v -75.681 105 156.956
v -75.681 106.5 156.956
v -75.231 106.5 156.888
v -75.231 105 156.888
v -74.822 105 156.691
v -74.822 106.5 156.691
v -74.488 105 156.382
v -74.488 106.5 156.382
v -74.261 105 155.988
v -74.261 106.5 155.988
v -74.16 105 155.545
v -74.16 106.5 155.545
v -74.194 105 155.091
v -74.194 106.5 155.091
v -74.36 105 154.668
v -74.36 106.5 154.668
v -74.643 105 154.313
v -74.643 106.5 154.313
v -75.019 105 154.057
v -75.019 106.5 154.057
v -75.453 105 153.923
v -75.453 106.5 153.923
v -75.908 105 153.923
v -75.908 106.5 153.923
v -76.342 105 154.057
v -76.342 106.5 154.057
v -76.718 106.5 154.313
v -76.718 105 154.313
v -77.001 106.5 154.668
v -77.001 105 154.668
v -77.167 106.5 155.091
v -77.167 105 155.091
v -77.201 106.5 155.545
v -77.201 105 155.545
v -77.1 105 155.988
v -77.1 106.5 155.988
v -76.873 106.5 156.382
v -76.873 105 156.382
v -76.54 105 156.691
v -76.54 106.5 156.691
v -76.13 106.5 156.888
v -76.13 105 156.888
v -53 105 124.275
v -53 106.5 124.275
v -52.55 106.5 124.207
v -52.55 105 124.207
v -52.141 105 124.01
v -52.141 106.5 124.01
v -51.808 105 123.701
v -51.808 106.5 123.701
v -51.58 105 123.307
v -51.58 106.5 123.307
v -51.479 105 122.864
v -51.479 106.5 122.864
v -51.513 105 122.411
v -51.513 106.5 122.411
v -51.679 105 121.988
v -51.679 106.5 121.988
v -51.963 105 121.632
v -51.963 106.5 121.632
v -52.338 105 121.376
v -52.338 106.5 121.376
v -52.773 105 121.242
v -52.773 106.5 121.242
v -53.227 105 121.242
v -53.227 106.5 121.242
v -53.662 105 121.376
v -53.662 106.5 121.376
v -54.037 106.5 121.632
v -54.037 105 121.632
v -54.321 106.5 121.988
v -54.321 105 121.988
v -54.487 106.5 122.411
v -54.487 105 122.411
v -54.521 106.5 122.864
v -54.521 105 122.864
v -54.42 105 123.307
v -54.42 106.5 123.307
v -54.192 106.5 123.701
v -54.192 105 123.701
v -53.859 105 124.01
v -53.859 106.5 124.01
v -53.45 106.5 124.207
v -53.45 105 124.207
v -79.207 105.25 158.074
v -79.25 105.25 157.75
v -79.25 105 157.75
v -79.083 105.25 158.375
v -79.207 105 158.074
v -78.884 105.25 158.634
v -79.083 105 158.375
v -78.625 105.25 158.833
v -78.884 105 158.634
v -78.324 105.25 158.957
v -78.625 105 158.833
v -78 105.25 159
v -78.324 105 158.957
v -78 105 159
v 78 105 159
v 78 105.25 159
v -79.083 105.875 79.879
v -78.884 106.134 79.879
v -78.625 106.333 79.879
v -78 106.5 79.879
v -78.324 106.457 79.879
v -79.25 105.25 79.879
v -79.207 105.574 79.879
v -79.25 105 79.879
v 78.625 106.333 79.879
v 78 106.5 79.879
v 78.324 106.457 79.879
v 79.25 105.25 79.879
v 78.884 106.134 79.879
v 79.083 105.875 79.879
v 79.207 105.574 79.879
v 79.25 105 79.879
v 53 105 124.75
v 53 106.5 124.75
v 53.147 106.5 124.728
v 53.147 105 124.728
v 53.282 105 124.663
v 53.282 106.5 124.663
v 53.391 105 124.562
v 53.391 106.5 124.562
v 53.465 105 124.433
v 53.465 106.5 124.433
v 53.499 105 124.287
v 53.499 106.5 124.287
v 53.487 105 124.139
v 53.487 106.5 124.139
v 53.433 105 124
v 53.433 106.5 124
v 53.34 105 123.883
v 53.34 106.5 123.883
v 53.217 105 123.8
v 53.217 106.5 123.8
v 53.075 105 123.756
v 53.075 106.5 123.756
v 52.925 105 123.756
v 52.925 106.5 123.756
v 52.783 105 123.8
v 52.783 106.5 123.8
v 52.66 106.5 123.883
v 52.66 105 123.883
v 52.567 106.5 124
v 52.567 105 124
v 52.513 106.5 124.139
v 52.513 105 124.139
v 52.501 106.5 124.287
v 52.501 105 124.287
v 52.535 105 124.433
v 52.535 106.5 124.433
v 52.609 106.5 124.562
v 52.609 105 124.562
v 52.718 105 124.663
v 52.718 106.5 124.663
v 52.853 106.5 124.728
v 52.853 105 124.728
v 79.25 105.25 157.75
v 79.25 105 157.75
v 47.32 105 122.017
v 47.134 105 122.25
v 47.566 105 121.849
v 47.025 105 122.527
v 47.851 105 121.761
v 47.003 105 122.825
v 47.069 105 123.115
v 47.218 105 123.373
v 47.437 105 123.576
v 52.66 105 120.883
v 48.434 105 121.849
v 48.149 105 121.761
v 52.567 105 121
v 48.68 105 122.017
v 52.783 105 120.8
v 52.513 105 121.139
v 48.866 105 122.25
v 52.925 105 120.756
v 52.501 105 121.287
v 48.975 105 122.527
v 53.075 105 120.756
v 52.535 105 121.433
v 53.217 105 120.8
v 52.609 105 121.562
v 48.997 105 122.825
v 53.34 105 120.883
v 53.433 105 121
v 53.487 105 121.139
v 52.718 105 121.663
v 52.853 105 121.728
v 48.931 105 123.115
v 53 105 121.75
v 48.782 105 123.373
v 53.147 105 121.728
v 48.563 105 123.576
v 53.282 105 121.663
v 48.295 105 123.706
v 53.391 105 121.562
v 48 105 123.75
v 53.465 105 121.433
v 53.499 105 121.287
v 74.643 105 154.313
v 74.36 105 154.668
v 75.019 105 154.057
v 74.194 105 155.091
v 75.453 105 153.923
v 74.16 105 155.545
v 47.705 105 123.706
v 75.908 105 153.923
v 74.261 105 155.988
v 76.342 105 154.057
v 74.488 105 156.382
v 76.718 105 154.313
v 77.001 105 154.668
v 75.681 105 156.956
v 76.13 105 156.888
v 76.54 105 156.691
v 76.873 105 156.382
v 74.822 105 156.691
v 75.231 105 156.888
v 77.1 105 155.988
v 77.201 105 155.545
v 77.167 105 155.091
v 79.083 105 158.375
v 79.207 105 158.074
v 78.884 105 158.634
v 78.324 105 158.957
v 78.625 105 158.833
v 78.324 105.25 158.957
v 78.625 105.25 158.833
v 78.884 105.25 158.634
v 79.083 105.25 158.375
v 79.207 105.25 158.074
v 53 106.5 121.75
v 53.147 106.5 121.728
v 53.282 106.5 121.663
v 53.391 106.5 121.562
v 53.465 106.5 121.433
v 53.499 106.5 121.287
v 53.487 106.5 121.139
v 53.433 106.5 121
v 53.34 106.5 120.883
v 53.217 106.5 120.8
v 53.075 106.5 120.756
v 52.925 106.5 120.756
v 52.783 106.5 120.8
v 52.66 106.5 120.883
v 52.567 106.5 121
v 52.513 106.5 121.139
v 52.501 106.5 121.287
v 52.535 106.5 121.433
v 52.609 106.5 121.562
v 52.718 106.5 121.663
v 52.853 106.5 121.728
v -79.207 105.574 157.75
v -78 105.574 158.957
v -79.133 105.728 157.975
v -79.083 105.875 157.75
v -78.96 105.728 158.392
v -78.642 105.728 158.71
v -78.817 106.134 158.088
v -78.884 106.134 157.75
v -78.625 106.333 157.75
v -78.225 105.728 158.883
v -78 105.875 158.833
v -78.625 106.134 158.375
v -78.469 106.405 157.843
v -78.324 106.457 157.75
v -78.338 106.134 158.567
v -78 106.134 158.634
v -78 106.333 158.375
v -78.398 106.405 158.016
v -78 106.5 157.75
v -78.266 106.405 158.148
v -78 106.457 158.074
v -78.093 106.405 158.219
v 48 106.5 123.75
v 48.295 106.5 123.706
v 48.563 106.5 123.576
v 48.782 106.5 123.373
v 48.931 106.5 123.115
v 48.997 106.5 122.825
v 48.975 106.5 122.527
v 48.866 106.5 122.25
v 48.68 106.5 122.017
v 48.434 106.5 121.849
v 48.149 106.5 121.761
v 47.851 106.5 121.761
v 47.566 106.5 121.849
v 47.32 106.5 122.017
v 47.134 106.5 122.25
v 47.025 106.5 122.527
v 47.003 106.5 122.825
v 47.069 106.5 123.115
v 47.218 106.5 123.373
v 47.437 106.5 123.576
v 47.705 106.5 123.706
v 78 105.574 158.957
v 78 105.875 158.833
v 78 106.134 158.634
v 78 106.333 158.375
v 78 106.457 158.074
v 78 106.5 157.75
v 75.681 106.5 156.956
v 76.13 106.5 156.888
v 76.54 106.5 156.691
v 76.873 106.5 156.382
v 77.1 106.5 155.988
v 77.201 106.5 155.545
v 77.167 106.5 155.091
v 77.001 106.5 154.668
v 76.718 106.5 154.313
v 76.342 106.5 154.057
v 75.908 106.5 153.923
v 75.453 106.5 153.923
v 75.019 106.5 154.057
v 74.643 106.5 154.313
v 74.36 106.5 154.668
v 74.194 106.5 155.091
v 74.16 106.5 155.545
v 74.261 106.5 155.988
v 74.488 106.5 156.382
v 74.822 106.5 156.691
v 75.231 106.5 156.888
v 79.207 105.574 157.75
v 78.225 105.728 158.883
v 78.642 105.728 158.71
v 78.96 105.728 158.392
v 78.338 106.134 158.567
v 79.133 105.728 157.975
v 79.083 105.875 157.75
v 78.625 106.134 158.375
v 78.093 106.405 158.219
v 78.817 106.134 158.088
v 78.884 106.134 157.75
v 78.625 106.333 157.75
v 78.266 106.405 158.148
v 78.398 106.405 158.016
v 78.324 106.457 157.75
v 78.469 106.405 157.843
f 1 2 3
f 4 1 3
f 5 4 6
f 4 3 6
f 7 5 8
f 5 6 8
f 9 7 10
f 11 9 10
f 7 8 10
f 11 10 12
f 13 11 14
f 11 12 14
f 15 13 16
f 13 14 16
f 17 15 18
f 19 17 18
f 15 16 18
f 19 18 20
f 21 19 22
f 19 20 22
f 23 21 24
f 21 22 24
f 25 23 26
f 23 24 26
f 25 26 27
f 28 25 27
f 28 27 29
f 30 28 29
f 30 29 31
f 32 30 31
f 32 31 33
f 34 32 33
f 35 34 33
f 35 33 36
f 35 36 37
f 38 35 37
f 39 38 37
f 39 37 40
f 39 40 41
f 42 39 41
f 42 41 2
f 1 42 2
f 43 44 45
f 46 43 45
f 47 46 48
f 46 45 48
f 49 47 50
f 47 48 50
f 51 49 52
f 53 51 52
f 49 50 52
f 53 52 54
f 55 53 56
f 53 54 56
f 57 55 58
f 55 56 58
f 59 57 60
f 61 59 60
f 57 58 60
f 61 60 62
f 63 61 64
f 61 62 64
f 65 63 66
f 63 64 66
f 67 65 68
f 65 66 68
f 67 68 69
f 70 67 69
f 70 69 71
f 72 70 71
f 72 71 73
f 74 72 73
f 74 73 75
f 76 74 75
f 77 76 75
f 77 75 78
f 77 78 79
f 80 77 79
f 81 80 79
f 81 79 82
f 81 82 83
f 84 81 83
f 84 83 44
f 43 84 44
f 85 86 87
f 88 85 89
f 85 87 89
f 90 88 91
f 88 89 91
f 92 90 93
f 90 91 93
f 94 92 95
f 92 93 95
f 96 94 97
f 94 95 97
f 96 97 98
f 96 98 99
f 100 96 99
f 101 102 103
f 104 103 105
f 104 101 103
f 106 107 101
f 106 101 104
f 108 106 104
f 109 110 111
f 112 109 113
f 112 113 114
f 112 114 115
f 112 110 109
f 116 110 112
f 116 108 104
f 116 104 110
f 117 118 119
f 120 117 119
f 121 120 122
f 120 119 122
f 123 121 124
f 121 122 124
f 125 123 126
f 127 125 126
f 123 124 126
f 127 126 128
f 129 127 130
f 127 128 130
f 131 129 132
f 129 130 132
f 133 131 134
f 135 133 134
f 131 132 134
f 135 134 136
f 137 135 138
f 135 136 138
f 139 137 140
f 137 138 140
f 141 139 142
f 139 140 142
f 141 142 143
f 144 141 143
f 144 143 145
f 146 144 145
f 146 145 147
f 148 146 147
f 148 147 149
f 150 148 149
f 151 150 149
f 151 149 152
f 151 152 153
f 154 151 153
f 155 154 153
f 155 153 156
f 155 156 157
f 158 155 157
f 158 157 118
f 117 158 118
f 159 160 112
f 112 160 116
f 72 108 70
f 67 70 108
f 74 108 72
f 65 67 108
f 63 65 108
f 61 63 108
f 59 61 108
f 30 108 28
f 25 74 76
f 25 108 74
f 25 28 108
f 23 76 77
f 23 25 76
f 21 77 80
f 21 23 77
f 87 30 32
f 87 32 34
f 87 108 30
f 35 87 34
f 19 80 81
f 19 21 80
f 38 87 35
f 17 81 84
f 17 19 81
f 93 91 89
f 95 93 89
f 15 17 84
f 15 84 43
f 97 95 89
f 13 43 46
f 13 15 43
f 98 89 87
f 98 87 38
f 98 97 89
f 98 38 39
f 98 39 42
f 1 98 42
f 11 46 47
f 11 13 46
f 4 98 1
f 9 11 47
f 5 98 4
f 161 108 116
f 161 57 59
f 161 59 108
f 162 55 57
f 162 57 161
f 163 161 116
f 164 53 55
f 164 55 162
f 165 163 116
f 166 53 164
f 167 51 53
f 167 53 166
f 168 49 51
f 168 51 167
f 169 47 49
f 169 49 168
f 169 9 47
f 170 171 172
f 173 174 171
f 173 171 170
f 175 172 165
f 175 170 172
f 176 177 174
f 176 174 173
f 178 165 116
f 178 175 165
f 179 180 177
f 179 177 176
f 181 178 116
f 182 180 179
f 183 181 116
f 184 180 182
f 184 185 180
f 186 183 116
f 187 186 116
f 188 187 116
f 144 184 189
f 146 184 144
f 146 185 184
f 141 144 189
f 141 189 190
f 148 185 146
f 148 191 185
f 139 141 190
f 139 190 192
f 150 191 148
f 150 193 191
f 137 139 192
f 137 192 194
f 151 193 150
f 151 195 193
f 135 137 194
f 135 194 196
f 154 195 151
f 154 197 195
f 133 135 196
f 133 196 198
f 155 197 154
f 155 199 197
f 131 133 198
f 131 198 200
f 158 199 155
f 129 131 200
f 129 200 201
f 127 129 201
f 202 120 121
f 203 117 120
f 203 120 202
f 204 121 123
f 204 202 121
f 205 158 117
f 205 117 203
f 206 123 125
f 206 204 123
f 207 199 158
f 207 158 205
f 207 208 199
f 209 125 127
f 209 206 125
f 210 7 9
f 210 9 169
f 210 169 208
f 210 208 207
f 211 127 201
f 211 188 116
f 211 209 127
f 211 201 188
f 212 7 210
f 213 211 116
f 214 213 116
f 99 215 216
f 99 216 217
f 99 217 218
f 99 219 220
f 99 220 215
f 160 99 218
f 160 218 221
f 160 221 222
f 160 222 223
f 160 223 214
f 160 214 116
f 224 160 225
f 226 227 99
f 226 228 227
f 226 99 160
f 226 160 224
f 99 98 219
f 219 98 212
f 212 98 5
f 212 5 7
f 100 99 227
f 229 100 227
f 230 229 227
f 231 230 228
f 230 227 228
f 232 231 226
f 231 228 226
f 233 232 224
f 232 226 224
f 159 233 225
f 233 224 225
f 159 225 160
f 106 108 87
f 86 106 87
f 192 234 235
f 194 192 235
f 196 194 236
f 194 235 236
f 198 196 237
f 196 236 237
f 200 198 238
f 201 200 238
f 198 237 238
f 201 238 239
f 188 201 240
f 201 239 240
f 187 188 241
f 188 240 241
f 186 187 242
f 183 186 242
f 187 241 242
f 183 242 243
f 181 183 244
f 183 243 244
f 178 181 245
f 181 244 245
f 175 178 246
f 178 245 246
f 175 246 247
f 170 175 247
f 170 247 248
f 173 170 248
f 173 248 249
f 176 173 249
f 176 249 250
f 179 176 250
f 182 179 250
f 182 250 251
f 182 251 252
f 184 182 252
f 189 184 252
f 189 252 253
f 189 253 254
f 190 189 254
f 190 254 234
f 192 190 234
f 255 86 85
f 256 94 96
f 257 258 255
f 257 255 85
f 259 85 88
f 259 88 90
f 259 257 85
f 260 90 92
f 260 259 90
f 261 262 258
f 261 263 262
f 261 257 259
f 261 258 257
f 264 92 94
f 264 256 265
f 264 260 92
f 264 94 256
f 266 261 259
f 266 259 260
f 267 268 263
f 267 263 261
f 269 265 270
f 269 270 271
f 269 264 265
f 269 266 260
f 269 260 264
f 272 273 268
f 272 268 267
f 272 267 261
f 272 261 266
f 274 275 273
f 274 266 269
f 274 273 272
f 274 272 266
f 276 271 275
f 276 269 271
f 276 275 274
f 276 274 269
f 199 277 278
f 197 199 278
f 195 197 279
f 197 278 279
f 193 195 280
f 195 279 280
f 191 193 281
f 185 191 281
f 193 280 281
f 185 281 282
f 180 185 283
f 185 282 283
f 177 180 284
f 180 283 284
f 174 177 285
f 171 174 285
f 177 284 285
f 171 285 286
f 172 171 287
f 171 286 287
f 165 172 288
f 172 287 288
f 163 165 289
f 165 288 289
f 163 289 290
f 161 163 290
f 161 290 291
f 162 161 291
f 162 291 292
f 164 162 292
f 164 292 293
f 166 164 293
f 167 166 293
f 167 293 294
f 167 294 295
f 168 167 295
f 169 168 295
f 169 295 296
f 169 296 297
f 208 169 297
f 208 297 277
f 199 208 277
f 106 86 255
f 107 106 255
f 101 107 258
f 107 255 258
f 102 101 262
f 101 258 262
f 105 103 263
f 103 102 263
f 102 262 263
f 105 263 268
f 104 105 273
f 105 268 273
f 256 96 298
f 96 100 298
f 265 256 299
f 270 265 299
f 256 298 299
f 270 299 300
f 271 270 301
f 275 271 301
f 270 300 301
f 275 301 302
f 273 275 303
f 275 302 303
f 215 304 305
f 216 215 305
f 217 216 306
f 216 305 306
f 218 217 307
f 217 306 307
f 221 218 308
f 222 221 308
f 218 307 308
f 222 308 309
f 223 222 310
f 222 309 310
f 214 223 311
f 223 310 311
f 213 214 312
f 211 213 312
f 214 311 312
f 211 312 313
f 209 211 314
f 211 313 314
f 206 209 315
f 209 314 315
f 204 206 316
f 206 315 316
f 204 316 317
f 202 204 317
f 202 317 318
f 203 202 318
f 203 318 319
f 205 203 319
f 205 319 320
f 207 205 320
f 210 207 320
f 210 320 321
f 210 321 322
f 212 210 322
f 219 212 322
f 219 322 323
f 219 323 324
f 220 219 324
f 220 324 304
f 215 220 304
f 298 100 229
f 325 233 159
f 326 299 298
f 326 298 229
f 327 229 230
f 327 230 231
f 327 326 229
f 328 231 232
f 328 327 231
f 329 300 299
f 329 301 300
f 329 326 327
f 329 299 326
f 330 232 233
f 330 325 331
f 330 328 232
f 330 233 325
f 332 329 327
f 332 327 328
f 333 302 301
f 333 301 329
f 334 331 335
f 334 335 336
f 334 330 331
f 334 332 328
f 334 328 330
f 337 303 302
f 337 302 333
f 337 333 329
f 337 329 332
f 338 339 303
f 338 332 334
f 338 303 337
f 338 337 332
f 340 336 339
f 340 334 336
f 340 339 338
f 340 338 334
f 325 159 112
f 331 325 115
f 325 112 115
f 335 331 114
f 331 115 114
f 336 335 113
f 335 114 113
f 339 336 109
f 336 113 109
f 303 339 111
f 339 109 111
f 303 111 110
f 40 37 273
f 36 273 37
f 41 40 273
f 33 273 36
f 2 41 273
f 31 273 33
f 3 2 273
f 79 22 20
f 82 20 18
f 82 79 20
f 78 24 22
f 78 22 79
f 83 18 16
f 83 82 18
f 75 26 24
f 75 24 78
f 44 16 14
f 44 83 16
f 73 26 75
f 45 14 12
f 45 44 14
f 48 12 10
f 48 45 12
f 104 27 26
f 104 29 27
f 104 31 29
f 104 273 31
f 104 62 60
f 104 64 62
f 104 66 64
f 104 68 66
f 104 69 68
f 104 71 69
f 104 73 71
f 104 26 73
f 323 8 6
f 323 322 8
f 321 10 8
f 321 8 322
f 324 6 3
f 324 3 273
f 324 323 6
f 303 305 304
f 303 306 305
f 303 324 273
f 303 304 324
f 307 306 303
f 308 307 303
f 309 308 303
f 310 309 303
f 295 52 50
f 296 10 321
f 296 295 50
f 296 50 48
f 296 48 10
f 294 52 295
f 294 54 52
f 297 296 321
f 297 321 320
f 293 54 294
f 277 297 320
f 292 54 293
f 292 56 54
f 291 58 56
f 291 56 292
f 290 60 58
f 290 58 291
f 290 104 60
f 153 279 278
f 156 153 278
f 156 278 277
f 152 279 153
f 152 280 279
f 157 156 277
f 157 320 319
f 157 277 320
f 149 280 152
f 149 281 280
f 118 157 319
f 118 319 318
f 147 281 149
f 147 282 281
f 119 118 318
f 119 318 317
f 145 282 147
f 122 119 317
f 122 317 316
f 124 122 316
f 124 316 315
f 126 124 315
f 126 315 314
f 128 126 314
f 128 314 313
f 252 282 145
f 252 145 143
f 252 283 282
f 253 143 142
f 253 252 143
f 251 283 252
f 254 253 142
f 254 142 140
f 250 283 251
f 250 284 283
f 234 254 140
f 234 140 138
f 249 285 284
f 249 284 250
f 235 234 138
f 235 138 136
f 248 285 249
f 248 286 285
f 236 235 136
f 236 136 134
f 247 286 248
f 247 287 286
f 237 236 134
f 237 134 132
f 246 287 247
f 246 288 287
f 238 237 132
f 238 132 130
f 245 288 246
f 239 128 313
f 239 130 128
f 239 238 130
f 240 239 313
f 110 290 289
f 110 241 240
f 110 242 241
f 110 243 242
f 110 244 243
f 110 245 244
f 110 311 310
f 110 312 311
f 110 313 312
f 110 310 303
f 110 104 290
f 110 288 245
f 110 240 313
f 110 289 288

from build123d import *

# Parameters (mm, degrees)
BOSS_EXTRUDE1_DEPTH      = 1.25
SKETCH1_W                = 156
SKETCH1_H                = 69.5
BOSS_EXTRUDE2_DEPTH      = 105
SKETCH4_R                = 2.5000000000000027
BOSS_EXTRUDE3_DEPTH      = 8
FILLET2_R                = 2
SKETCH5_R                = 1.5499999999999998
SKETCH5_R_2              = 1.5500000000000012
CUT_EXTRUDE1_DEPTH       = 8
SKETCH6_R                = 8.25
CUT_EXTRUDE2_DEPTH       = 8
SKETCH8_R                = 3.750000000000007
SKETCH8_R_2              = 3.0000000000000084
SKETCH8_W                = 7.000000000000014
SKETCH8_H                = 14
CUT_EXTRUDE3_DEPTH       = 8
FILLET3_R                = 1.25
FILLET4_R                = 1.25
SKETCH11_R               = 1.5499999999999932
CUT_EXTRUDE4_DEPTH       = 8
BOSS_EXTRUDE5_REACH      = 209.004
FILLET5_R                = 1.25
SKETCH14_R               = 1.5249999999999995
CUT_EXTRUDE5_DEPTH       = 8
BOSS_EXTRUDE6_DEPTH      = 5
CUT_EXTRUDE10_DEPTH      = 176.50000000000017
CUT_EXTRUDE10_DEPTH_BACK = 9
SKETCH19_R               = 1.5249999999999995
BOSS_EXTRUDE7_DEPTH      = 1.5
SKETCH17_W               = 214.39373035957487
SKETCH17_H               = 311.75060194691184
CUT_EXTRUDE6_DEPTH       = 142.50000000000003
SKETCH18_W               = 843.8612520819788
SKETCH18_H               = 210.19069540658822
CUT_EXTRUDE7_DEPTH       = 211.50000000000009
FILLET6_R                = 1.25
SKETCH21_R               = 1.5249999999999995
CUT_EXTRUDE11_DEPTH      = 46.50000000000004
SKETCH22_R               = 1.5249999999999952
SKETCH22_R_2             = 0.49999999999999917
SKETCH22_R_3             = 0.9999999999999983
CUT_EXTRUDE12_DEPTH      = 46.50000000000004
SKETCH23_W               = 224.34927592813784
SKETCH23_H               = 20
CUT_EXTRUDE13_DEPTH      = 108.00000000000004
SKETCH24_W               = 191.54769742783472
SKETCH24_H               = 65.90413284325967
CUT_EXTRUDE14_DEPTH      = 151.00000000000006


with BuildPart() as part:
    # Sketch2 → Boss-Extrude1 (new body)
    with BuildSketch(Plane(origin=(0, 0, 0), x_dir=(1, 0, 0), z_dir=(0, 1, 0))):
        Polygon((-79.25000000000004, 35.99999999999998), (79.24999999999996, 35.99999999999999), (79.24999999999999, -159.00000000000003), (-79.25000000000001, -159.00000000000003), align=None)
    extrude(amount=-BOSS_EXTRUDE1_DEPTH)

    # Sketch1 → Boss-Extrude2 (add)
    with BuildSketch(Plane(origin=(0, 0, 0), x_dir=(1, 0, 0), z_dir=(0, 1, 0))):
        Polygon((79.24999999999999, -159.00000000000003), (-79.25000000000001, -159.00000000000003), (-79.25000000000004, -86.00000000000001), (-79.25000000000004, -36.00000000000002), (-79.25000000000004, 35.99999999999998), (79.24999999999996, 35.99999999999999), (79.24999999999996, -36.00000000000002), (79.24999999999996, -86.00000000000001), align=None)
        Polygon((-78.00000000000001, -157.75000000000006), (77.99999999999999, -157.75000000000006), (77.99999999999996, -86.00000000000001), (77.99999999999996, -36.00000000000002), (-78.00000000000004, -36.00000000000002), (-78.00000000000004, -86.00000000000001), (-78.00000000000004, -100.58859756900745), align=None, mode=Mode.SUBTRACT)
        Rectangle(SKETCH1_W, SKETCH1_H, mode=Mode.SUBTRACT)
    extrude(amount=BOSS_EXTRUDE2_DEPTH)

    # Sketch4 → Boss-Extrude3 (add)
    with BuildSketch(Plane(origin=(0, 0, 0), x_dir=(1, 0, 0), z_dir=(0, 1, 0))):
        with Locations(Location((-37.074999999999996, -117.75000000000004, 0), (0, 0, 90))):
            Circle(SKETCH4_R)
        with Locations(Location((37.074999999999996, -117.75000000000003, 0), (0, 0, 90))):
            Circle(SKETCH4_R)
    extrude(amount=BOSS_EXTRUDE3_DEPTH)

    # Fillet2
    fillet2_edges = [part.edges().sort_by_distance(p)[0] for p in [
        (77.99999999999996, 52.5, -34.749999999999986),
        (77.99999999999996, 52.5, 34.750000000000014),
        (-78.00000000000004, 0, 1.421e-14),
        (-78.00000000000004, 52.5, 34.750000000000014),
        (77.99999999999999, 52.5, 157.75000000000006),
        (-78.00000000000001, 52.5, 157.75000000000006),
        (-4.263e-14, 0, 36.00000000000002),
        (-78.00000000000004, 52.5, 36.00000000000002),
        (77.99999999999997, 0, 96.87500000000003),
        (77.99999999999996, 52.5, 36.00000000000002),
        (-4.263e-14, 0, -34.749999999999986),
        (-78.00000000000004, 52.5, -34.749999999999986),
        (-1.421e-14, 0, 157.75000000000006),
        (-78.00000000000003, 0, 96.87500000000004),
        (77.99999999999996, 0, 1.421e-14),
        (-4.263e-14, 0, 34.750000000000014),
        (-37.074999999999996, 0, 120.25000000000004),
        (37.074999999999996, 0, 120.25000000000003),
    ]]
    fillet(fillet2_edges, radius=FILLET2_R)

    # Sketch5 → Cut-Extrude1 (cut)
    with BuildSketch(Plane.XY.offset(36.00000000000002)):
        with BuildLine():
            ThreePointArc((-53.750000000000085, 99.54999999999998), (-54.84601551083924, 99.09601551083914), (-55.30000000000008, 97.99999999999999))
            Line((-55.30000000000008, 97.99999999999999), (-53.750000000000085, 97.99999999999999))
            Line((-53.750000000000085, 97.99999999999999), (-53.750000000000085, 99.54999999999998))
        make_face()
        with BuildLine():
            Line((-53.750000000000085, 97.99999999999999), (-55.30000000000008, 97.99999999999999))
            ThreePointArc((-55.30000000000008, 97.99999999999999), (-53.750000000000085, 96.44999999999999), (-52.20000000000009, 97.99999999999999))
            ThreePointArc((-52.20000000000009, 97.99999999999999), (-52.65398448916093, 99.09601551083914), (-53.750000000000085, 99.54999999999998))
            Line((-53.750000000000085, 99.54999999999998), (-53.750000000000085, 97.99999999999999))
        make_face()
        with Locations((53.750000000000206, 97.99999999999967)):
            Circle(SKETCH5_R)
        with Locations((-53.750000000000085, 7.999999999999743)):
            Circle(SKETCH5_R_2)
        with Locations((53.749999999999666, 7.9999999999994245)):
            Circle(SKETCH5_R_2)
    extrude(amount=-CUT_EXTRUDE1_DEPTH, mode=Mode.SUBTRACT)

    # Sketch6 → Cut-Extrude2 (cut)
    with BuildSketch(Plane(origin=(0, 0, 157.75000000000006), x_dir=(-1, 0, 0), z_dir=(0, 0, -1))):
        with Locations((0, 22)):
            Circle(SKETCH6_R)
    extrude(amount=-CUT_EXTRUDE2_DEPTH, mode=Mode.SUBTRACT)

    # Sketch8 → Cut-Extrude3 (cut)
    with BuildSketch(Plane.ZY.offset(79.25000000000004)):
        with Locations((131.5, 54.99999999999998)):
            Circle(SKETCH8_R)
        with Locations((101.50000000000001, 54.99999999999998)):
            Circle(SKETCH8_R_2)
        with Locations((116.50000000000003, 64.99999999999999)):
            Rectangle(SKETCH8_W, SKETCH8_H)
        with Locations((101.50000000000001, 64.99999999999997)):
            Circle(SKETCH8_R_2)
        with Locations((101.50000000000001, 74.99999999999997)):
            Circle(SKETCH8_R_2)
        with Locations((101.50000000000001, 84.99999999999997)):
            Circle(SKETCH8_R_2)
        with Locations((131.5, 74.99999999999999)):
            Circle(SKETCH8_R)
    extrude(amount=-CUT_EXTRUDE3_DEPTH, mode=Mode.SUBTRACT)

    # Fillet3
    fillet3_edges = [part.edges().sort_by_distance(p)[0] for p in [
        (79.24999999999997, -1.25, 61.50000000000002),
        (-4.263e-14, -1.25, -35.999999999999986),
        (-79.25000000000003, -1.25, 61.50000000000003),
        (-1.421e-14, -1.25, 159.00000000000003),
    ]]
    fillet(fillet3_edges, radius=FILLET3_R)

    # Fillet4
    # the kernel refuses this fillet: 1.25 mm, written as the material it takes off along each edge
    with BuildSketch(Plane(origin=(-78.00000000000004, 0, -34.74999999999997), x_dir=(-9e-17, 0, -1), z_dir=(-1, 0, 1.5e-16))) as fillet4_piece_1_section:
        Polygon((0, 0), (FILLET4_R, 0), (FILLET4_R, FILLET4_R), (0, FILLET4_R), align=None)
    fillet4_piece_1 = extrude(amount=FILLET4_R, mode=Mode.PRIVATE)
    fillet4_piece_1 = fillet4_piece_1 - Plane(origin=(-78.00000000000004, 0, -34.74999999999997), x_dir=(0, 0.7071067811865475, 0.7071067811865475), z_dir=(-1, 0, 1.5e-16)) * Sphere(FILLET4_R, mode=Mode.PRIVATE)
    add(fillet4_piece_1, mode=Mode.SUBTRACT)
    with BuildSketch(Plane(origin=(77.99999999999996, 0, -34.74999999999999), x_dir=(-9e-17, 0, -1), z_dir=(1, 0, -1.5e-16))) as fillet4_piece_2_section:
        Polygon((0, 0), (FILLET4_R, 0), (FILLET4_R, -FILLET4_R), (0, -FILLET4_R), align=None)
    fillet4_piece_2 = extrude(amount=FILLET4_R, mode=Mode.PRIVATE)
    fillet4_piece_2 = fillet4_piece_2 - Plane(origin=(77.99999999999996, 0, -34.74999999999999), x_dir=(0, 0.7071067811865475, 0.7071067811865475), z_dir=(1, 0, -1.5e-16)) * Sphere(FILLET4_R, mode=Mode.PRIVATE)
    add(fillet4_piece_2, mode=Mode.SUBTRACT)
    with BuildSketch(Plane(origin=(-78.00000000000001, 0, 157.75000000000003), x_dir=(-1, 0, 1.5e-16), z_dir=(0, 0, 1))) as fillet4_piece_3_section:
        Polygon((0, 0), (FILLET4_R, 0), (FILLET4_R, FILLET4_R), (0, FILLET4_R), align=None)
    fillet4_piece_3 = extrude(amount=FILLET4_R, mode=Mode.PRIVATE)
    fillet4_piece_3 = fillet4_piece_3 - Plane(origin=(-78.00000000000001, 0, 157.75000000000003), x_dir=(0.7071067811865475, 0.7071067811865475, 0), z_dir=(0, 0, 1)) * Sphere(FILLET4_R, mode=Mode.PRIVATE)
    add(fillet4_piece_3, mode=Mode.SUBTRACT)
    with BuildSketch(Plane(origin=(77.99999999999999, 0, 157.75000000000003), x_dir=(1, 0, -1.5e-16), z_dir=(0, 0, 1))) as fillet4_piece_4_section:
        Polygon((0, 0), (FILLET4_R, 0), (FILLET4_R, -FILLET4_R), (0, -FILLET4_R), align=None)
    fillet4_piece_4 = extrude(amount=FILLET4_R, mode=Mode.PRIVATE)
    fillet4_piece_4 = fillet4_piece_4 - Plane(origin=(77.99999999999999, 0, 157.75000000000003), x_dir=(-0.7071067811865475, 0.7071067811865475, 0), z_dir=(0, 0, 1)) * Sphere(FILLET4_R, mode=Mode.PRIVATE)
    add(fillet4_piece_4, mode=Mode.SUBTRACT)
    with BuildSketch(Plane(origin=(79.24999999999999, 108.12500000000007, 159.00000000000003), x_dir=(-1, 0, 0), z_dir=(0, -1, 0))) as fillet4_piece_5:
        with BuildLine():
            CenterArc((FILLET4_R, FILLET4_R), FILLET4_R, 179.9999999999987, 90.00000000000131)
            Line((0, FILLET4_R), (0, 0))
            Line((0, 0), (FILLET4_R, 0))
        make_face()
    extrude(amount=108.12500000000007, mode=Mode.SUBTRACT)
    with BuildSketch(Plane(origin=(-79.25000000000001, -2.2e-16, 159.00000000000003), x_dir=(1, 0, 0), z_dir=(0, 1, 0))) as fillet4_piece_6:
        with BuildLine():
            CenterArc((FILLET4_R, FILLET4_R), FILLET4_R, 180, 90)
            Line((0, FILLET4_R), (0, 0))
            Line((0, 0), (FILLET4_R, 0))
        make_face()
    extrude(amount=108.12499999999999, mode=Mode.SUBTRACT)
    with BuildSketch(Plane(origin=(79.24999999999996, 108.125, -35.99999999999999), x_dir=(0, 0, 1), z_dir=(0, -1, 0))) as fillet4_piece_7:
        with BuildLine():
            CenterArc((FILLET4_R, FILLET4_R), FILLET4_R, 180, 90)
            Line((0, FILLET4_R), (0, 0))
            Line((0, 0), (FILLET4_R, 0))
        make_face()
    extrude(amount=108.125, mode=Mode.SUBTRACT)
    with BuildSketch(Plane(origin=(-79.25000000000004, -2.2e-16, -35.99999999999998), x_dir=(0, 0, 1), z_dir=(0, 1, 0))) as fillet4_piece_8:
        with BuildLine():
            CenterArc((FILLET4_R, FILLET4_R), FILLET4_R, 180, 90)
            Line((-2.132e-14, FILLET4_R), (0, 0))
            Line((0, 0), (FILLET4_R, 0))
        make_face()
    extrude(amount=108.12499999999999, mode=Mode.SUBTRACT)

    # Sketch11 → Cut-Extrude4 (cut)
    with BuildSketch(Plane(origin=(79.24999999999996, 0, -1.128e-14), x_dir=(-1.4e-16, 0, -1), z_dir=(1, 0, -1.4e-16))):
        with BuildLine():
            ThreePointArc((-13.05000000000001, 102.49999999999999), (-12.596015510839159, 101.40398448916083), (-11.50000000000001, 100.94999999999999))
            Line((-11.50000000000001, 100.94999999999999), (-11.50000000000001, 102.49999999999999))
            Line((-11.500000000000014, 102.49999999999999), (-13.050000000000011, 102.49999999999999))
        make_face()
        with BuildLine():
            Line((-11.50000000000001, 102.49999999999999), (-11.50000000000001, 100.94999999999999))
            ThreePointArc((-11.50000000000001, 100.94999999999999), (-10.403984489160864, 101.40398448916083), (-9.950000000000012, 102.49999999999999))
            ThreePointArc((-9.950000000000012, 102.49999999999999), (-11.50000000000001, 104.04999999999998), (-13.05000000000001, 102.49999999999999))
            Line((-13.050000000000011, 102.49999999999999), (-11.500000000000014, 102.49999999999999))
        make_face()
        with BuildLine():
            ThreePointArc((-25.550000000000008, 90), (-25.096015510839155, 88.90398448916085), (-24.000000000000007, 88.45))
            Line((-24.000000000000007, 88.45000000000002), (-24.000000000000007, 90))
            Line((-24, 90), (-25.55000000000001, 90))
        make_face()
        with BuildLine():
            Line((-24.000000000000007, 90), (-24.000000000000007, 88.45000000000002))
            ThreePointArc((-24.000000000000007, 88.45), (-22.90398448916086, 88.90398448916085), (-22.450000000000006, 90))
            ThreePointArc((-22.450000000000006, 90), (-24.000000000000007, 91.55), (-25.550000000000008, 90))
            Line((-25.55000000000001, 90), (-24, 90))
        make_face()
        with BuildLine():
            ThreePointArc((-9.949999999999998, 2.4999999999999742), (-10.403984489160848, 3.5960155108391216), (-11.499999999999995, 4.049999999999974))
            Line((-11.499999999999996, 4.049999999999969), (-11.499999999999996, 2.4999999999999716))
            Line((-11.5, 2.4999999999999742), (-13.049999999999997, 2.4999999999999742))
            ThreePointArc((-13.049999999999995, 2.4999999999999742), (-11.499999999999996, 0.9499999999999749), (-9.949999999999998, 2.499999999999974))
        make_face()
        with BuildLine():
            Line((-11.499999999999996, 2.4999999999999716), (-11.499999999999996, 4.049999999999969))
            ThreePointArc((-11.499999999999995, 4.049999999999974), (-12.596015510839145, 3.596015510839123), (-13.049999999999995, 2.4999999999999742))
            Line((-13.049999999999997, 2.4999999999999742), (-11.5, 2.4999999999999742))
        make_face()
        with BuildLine():
            ThreePointArc((-111.5, 4.049999999999969), (-112.59601551083915, 1.40398448916083), (-109.95, 2.499999999999974))
            Line((-109.95, 2.4999999999999742), (-111.5, 2.4999999999999742))
            Line((-111.5, 2.4999999999999716), (-111.5, 4.049999999999969))
        make_face()
        with BuildLine():
            Line((-111.5, 2.4999999999999742), (-109.95, 2.4999999999999742))
            ThreePointArc((-109.95, 2.4999999999999742), (-110.40398448916086, 3.5960155108391185), (-111.5, 4.049999999999969))
            Line((-111.5, 4.049999999999969), (-111.5, 2.4999999999999716))
        make_face()
        with BuildLine():
            ThreePointArc((-97.45, 14.999999999999993), (-97.90398448916086, 16.096015510839138), (-99, 16.549999999999986))
            Line((-99, 16.549999999999986), (-99, 14.999999999999993))
            Line((-99, 14.999999999999993), (-97.45, 14.999999999999993))
        make_face()
        with BuildLine():
            Line((-99, 14.999999999999993), (-99, 16.549999999999986))
            ThreePointArc((-99, 16.549999999999986), (-100.09601551083915, 13.903984489160848), (-97.45, 14.999999999999993))
            Line((-97.45, 14.999999999999993), (-99, 14.999999999999993))
        make_face()
        with BuildLine():
            ThreePointArc((-22.450000000000006, 14.999999999999993), (-22.90398448916086, 16.09601551083914), (-24.000000000000007, 16.549999999999994))
            Line((-24.000000000000007, 16.549999999999994), (-24.000000000000007, 14.999999999999993))
            Line((-24, 14.999999999999993), (-25.55000000000001, 14.999999999999993))
            ThreePointArc((-25.550000000000008, 14.999999999999993), (-24.000000000000007, 13.449999999999992), (-22.450000000000006, 14.999999999999993))
        make_face()
        with BuildLine():
            Line((-24.000000000000007, 14.999999999999993), (-24.000000000000007, 16.549999999999994))
            ThreePointArc((-24.000000000000007, 16.549999999999994), (-25.096015510839155, 16.09601551083914), (-25.550000000000008, 14.999999999999993))
            Line((-25.55000000000001, 14.999999999999993), (-24, 14.999999999999993))
        make_face()
        with Locations((-111.50000000000001, 102.49999999999999)):
            Circle(SKETCH11_R)
        with Locations((-99, 90)):
            Circle(SKETCH11_R)
    extrude(amount=-CUT_EXTRUDE4_DEPTH, mode=Mode.SUBTRACT)

    # Boss-Extrude5: up to this face of the body (flat: up to its plane)
    boss_extrude5_end = Plane(part.part.faces().sort_by_distance((0, 0, 96.725539908))[0])
    # Sketch12 → Boss-Extrude5 (add, up to the picked face)
    with BuildSketch(Plane(origin=(0, 105, 0), x_dir=(1, 0, 0), z_dir=(0, 1, 0)), mode=Mode.PRIVATE) as boss_extrude5_sk1:
        with BuildLine():
            Line((73, -152.75000000000043), (72.99999999999997, -157.75000000000043))
            Line((72.99999999999997, -157.75000000000043), (75.99999999999996, -157.75000000000045))
            ThreePointArc((75.99999999999996, -157.75000000000006), (77.41421356237305, -157.16421356237316), (77.99999999999994, -155.75000000000006))
            Line((77.99999999999999, -155.75000000000006), (78, -152.75000000000045))
            Line((78, -152.75000000000045), (73, -152.75000000000043))
        make_face()
    boss_extrude5_tool1 = split(extrude(boss_extrude5_sk1.sketch, amount=-BOSS_EXTRUDE5_REACH, mode=Mode.PRIVATE), bisect_by=boss_extrude5_end, keep=Keep.BOTH, mode=Mode.PRIVATE)
    # Sketch12 → Boss-Extrude5 (add, up to the picked face)
    with BuildSketch(Plane(origin=(0, 105, 0), x_dir=(1, 0, 0), z_dir=(0, 1, 0)), mode=Mode.PRIVATE) as boss_extrude5_sk2:
        with BuildLine():
            ThreePointArc((-78.00000000000003, -155.75000000000006), (-77.41421356237313, -157.16421356237316), (-76.00000000000003, -157.75000000000006))
            Line((-76.00000000000003, -157.75000000000006), (-73.00000000000003, -157.75000000000006))
            Line((-73.00000000000003, -157.75000000000006), (-73.00000000000003, -152.75000000000006))
            Line((-73.00000000000003, -152.75000000000006), (-78.00000000000003, -152.75000000000006))
            Line((-78.00000000000003, -152.75000000000006), (-78.00000000000003, -155.75000000000006))
        make_face()
    boss_extrude5_tool2 = split(extrude(boss_extrude5_sk2.sketch, amount=-BOSS_EXTRUDE5_REACH, mode=Mode.PRIVATE), bisect_by=boss_extrude5_end, keep=Keep.BOTH, mode=Mode.PRIVATE)
    add(boss_extrude5_tool1.solids().sort_by(Axis((75.426992, 105, 155.176992), (0, -1, 0)))[0])
    add(boss_extrude5_tool2.solids().sort_by(Axis((-75.426992, 105, 155.176992), (0, -1, 0)))[0])

    # Fillet5
    fillet5_edges = [part.edges().sort_by_distance(p)[0] for p in [
        (77.41421356237306, 0.5857864376269042, 152.75000000000043),
        (72.99999999999999, 0.5857864376269046, 157.16421356237316),
        (72.99999999999997, 53.5, 157.75000000000043),
        (74.49999999999999, 0, 152.75000000000043),
        (73, 52.5, 152.75000000000043),
        (78, 53.5, 152.75000000000045),
        (73, 0, 154.25000000000023),
        (-77.41421356237313, 0.5857864376269042, 152.75000000000006),
        (-73.00000000000003, 0, 154.25000000000006),
        (-73.00000000000003, 52.5, 152.75000000000006),
        (-78.00000000000003, 53.5, 152.75000000000006),
        (-74.50000000000003, 0, 152.75000000000006),
        (-73.00000000000003, 0.5857864376269046, 157.16421356237316),
        (-73.00000000000003, 53.5, 157.75000000000006),
    ]]
    fillet(fillet5_edges, radius=FILLET5_R)

    # Sketch14 → Cut-Extrude5 (cut)
    with BuildSketch(Plane(origin=(0, 105, 0), x_dir=(1, 0, 0), z_dir=(0, 1, 0))):
        with Locations(Location((75.68305826175839, -155.43305826175865, 0), (0, 0, 270))):
            Circle(SKETCH14_R)
        with Locations(Location((-75.68305826175845, -155.43305826175828, 0), (0, 0, 270))):
            Circle(SKETCH14_R)
    extrude(amount=-CUT_EXTRUDE5_DEPTH, mode=Mode.SUBTRACT)

    # Sketch19 → Cut-Extrude10 (cut, two sides: drawn at the far end of the back side and taken through both)
    with BuildSketch(Plane(origin=(0, 105, 0), x_dir=(1, 0, 0), z_dir=(0, 1, 0)).offset(-CUT_EXTRUDE10_DEPTH_BACK)):
        with Locations(Location((75.68305826175839, -155.43305826175865, 0), (0, 0, 270))):
            Circle(SKETCH19_R)
        with Locations(Location((-75.68305826175845, -155.43305826175828, 0), (0, 0, 270))):
            Circle(SKETCH19_R)
    extrude(amount=CUT_EXTRUDE10_DEPTH + CUT_EXTRUDE10_DEPTH_BACK, mode=Mode.SUBTRACT)



with BuildPart() as body_2:
    # Sketch15 → Boss-Extrude6 (new body)
    with BuildSketch(Plane(origin=(0, 105, 0), x_dir=(1, 0, 0), z_dir=(0, 1, 0))):
        with BuildLine():
            Line((-77.50000000000004, 32.749999999999986), (-77.50000000000004, -32.750000000000014))
            ThreePointArc((-77.50000000000004, -32.750000000000014), (-77.06066017177986, -33.81066017177984), (-76.00000000000004, -34.250000000000014))
            Line((-76.00000000000004, -34.250000000000014), (75.99999999999996, -34.250000000000014))
            ThreePointArc((75.99999999999996, -34.250000000000014), (77.06066017177977, -33.81066017177984), (77.49999999999996, -32.750000000000014))
            Line((77.49999999999996, -32.750000000000014), (77.49999999999996, 32.749999999999986))
            ThreePointArc((77.49999999999996, 32.749999999999986), (77.06066017177977, 33.81066017177981), (75.99999999999996, 34.249999999999986))
            Line((75.99999999999996, 34.249999999999986), (-76.00000000000004, 34.249999999999986))
            ThreePointArc((-76.00000000000004, 34.249999999999986), (-77.06066017177986, 33.81066017177981), (-77.50000000000004, 32.749999999999986))
        make_face()
        with BuildLine():
            Line((75.99999999999996, 32.999999999999986), (-76.00000000000004, 32.999999999999986))
            ThreePointArc((-76.00000000000004, 32.999999999999986), (-76.17677669529668, 32.926776695296624), (-76.25000000000004, 32.749999999999986))
            Line((-76.25000000000004, 32.749999999999986), (-76.25000000000004, -32.750000000000014))
            ThreePointArc((-76.25000000000004, -32.750000000000014), (-76.17677669529668, -32.92677669529665), (-76.00000000000004, -33.000000000000014))
            Line((-76.00000000000004, -33.000000000000014), (75.99999999999996, -33.000000000000014))
            ThreePointArc((75.99999999999996, -33.000000000000014), (76.1767766952966, -32.92677669529665), (76.24999999999996, -32.750000000000014))
            Line((76.24999999999996, -32.750000000000014), (76.24999999999996, 32.749999999999986))
            ThreePointArc((76.24999999999996, 32.749999999999986), (76.1767766952966, 32.926776695296624), (75.99999999999996, 32.999999999999986))
        make_face(mode=Mode.SUBTRACT)
    extrude(amount=-BOSS_EXTRUDE6_DEPTH)


with BuildPart() as part_1:
    add(part.part)

    add(body_2.part)  # Boss-Extrude7 merges body 2
    # Sketch16 → Boss-Extrude7 (add)
    with BuildSketch(Plane(origin=(0, 105, 0), x_dir=(1, 0, 0), z_dir=(0, 1, 0))):
        with BuildLine():
            Line((-79.25000000000004, 34.74999999999998), (-79.25000000000004, -157.75000000000003))
            ThreePointArc((-79.25000000000004, -157.75000000000003), (-78.88388347648322, -158.63388347648322), (-78.00000000000001, -159.00000000000003))
            Line((-78.00000000000001, -159.00000000000003), (77.99999999999999, -159.00000000000003))
            ThreePointArc((77.99999999999999, -159.00000000000003), (78.88388347648316, -158.63388347648322), (79.24999999999999, -157.75000000000003))
            Line((79.24999999999999, -157.75000000000003), (79.24999999999991, 34.749999999999986))
            ThreePointArc((79.24999999999991, 34.749999999999986), (78.8838834764831, 35.63388347648314), (77.99999999999996, 35.99999999999997))
            Line((77.99999999999996, 35.99999999999997), (-78.00000000000004, 35.99999999999998))
            ThreePointArc((-78.00000000000004, 35.99999999999998), (-78.88388347648322, 35.63388347648316), (-79.25000000000004, 34.74999999999998))
        make_face()
    extrude(amount=BOSS_EXTRUDE7_DEPTH)

    # Sketch17 → Cut-Extrude6 (cut)
    with BuildSketch(Plane.XZ.offset(-105)):
        with Locations((-9.695908791144348, 54.3605461890202)):
            Rectangle(SKETCH17_W, SKETCH17_H)
        with BuildLine():
            Line((77.99999999999996, -32.749999999999986), (77.99999999999996, 32.750000000000014))
            ThreePointArc((77.99999999999996, 32.750000000000014), (77.41421356237305, 34.16421356237311), (75.99999999999996, 34.750000000000014))
            Line((75.99999999999996, 34.750000000000014), (-76.00000000000004, 34.750000000000014))
            ThreePointArc((-76.00000000000004, 34.750000000000014), (-77.41421356237313, 34.16421356237311), (-78.00000000000004, 32.750000000000014))
            Line((-78.00000000000004, 32.750000000000014), (-78.00000000000004, -32.749999999999986))
            ThreePointArc((-78.00000000000004, -32.749999999999986), (-77.41421356237313, -34.16421356237308), (-76.00000000000004, -34.749999999999986))
            Line((-76.00000000000004, -34.749999999999986), (75.99999999999996, -34.749999999999986))
            ThreePointArc((75.99999999999996, -34.749999999999986), (77.41421356237305, -34.16421356237308), (77.99999999999996, -32.749999999999986))
        make_face(mode=Mode.SUBTRACT)
    extrude(amount=CUT_EXTRUDE6_DEPTH, mode=Mode.SUBTRACT)


with BuildPart() as cut_extrude6_piece_1:
    # of the separate pieces the step leaves, piece 1, a body of its own (cut_extrude6_pieces)
    add(part_1.part.solids().sort_by_distance((-76, 105, -34.25))[0])

    # Fillet6
    fillet6_edges = [cut_extrude6_piece_1.edges().sort_by_distance(p)[0] for p in [
        (-78.88388347648322, 106.5, -35.633883476483156),
        (-79.25000000000004, 106.5, 61.50000000000002),
        (-78.88388347648322, 106.5, 158.63388347648322),
        (-1.421e-14, 106.5, 159.00000000000003),
        (78.88388347648318, 106.5, 158.63388347648322),
        (79.24999999999994, 106.5, 61.50000000000003),
        (78.8838834764831, 106.5, -35.63388347648314),
        (-4.263e-14, 106.5, -35.99999999999997),
    ]]
    fillet(fillet6_edges, radius=FILLET6_R)

    # Sketch21 → Cut-Extrude11 (cut)
    with BuildSketch(Plane(origin=(0, 106.5, 0), x_dir=(1, 0, 0), z_dir=(0, 1, 0))):
        with Locations(Location((-75.68068975770814, -155.43068975770817, 0), (0, 0, 270))):
            Circle(SKETCH21_R)
        with Locations(Location((75.68068975770811, -155.43068975770834, 0), (0, 0, 270))):
            Circle(SKETCH21_R)
    extrude(amount=-CUT_EXTRUDE11_DEPTH, mode=Mode.SUBTRACT)

    # Sketch22 → Cut-Extrude12 (cut)
    with BuildSketch(Plane(origin=(0, 106.5, 0), x_dir=(1, 0, 0), z_dir=(0, 1, 0))):
        with Locations(Location((-53.000000000000014, -122.75000000000003, 0), (0, 0, 270))):
            Circle(SKETCH22_R)
        with Locations(Location((53.000000000000014, -121.25000000000003, 0), (0, 0, 270))):
            Circle(SKETCH22_R_2)
        with Locations(Location((53.000000000000014, -124.25000000000003, 0), (0, 0, 270))):
            Circle(SKETCH22_R_2)
        with Locations(Location((48.000000000000014, -122.75000000000003, 0), (0, 0, 270))):
            Circle(SKETCH22_R_3)
    extrude(amount=-CUT_EXTRUDE12_DEPTH, mode=Mode.SUBTRACT)

    # Sketch23 → Cut-Extrude13 (cut)
    with BuildSketch(Plane.XZ.offset(-105)):
        with Locations((5.748765940339929, 69.87855319631414)):
            Rectangle(SKETCH23_W, SKETCH23_H)
    extrude(amount=-CUT_EXTRUDE13_DEPTH, mode=Mode.SUBTRACT)


with BuildPart() as cut_extrude6_piece_2:
    # of the separate pieces the step leaves, piece 2, a body of its own (cut_extrude6_pieces)
    add(part_1.part.solids().sort_by_distance((-78, 2, -32.75))[0])

    # Sketch18 → Cut-Extrude7 (cut)
    with BuildSketch(Plane.XZ.offset(-99.99999999999999)):
        Rectangle(SKETCH18_W, SKETCH18_H)
    extrude(amount=CUT_EXTRUDE7_DEPTH, mode=Mode.SUBTRACT)


with BuildPart() as cut_extrude13_piece_1:
    # of the separate pieces the step leaves, piece 1, a body of its own (cut_extrude13_pieces)
    add(cut_extrude6_piece_1.part.solids().sort_by_distance((-79.25, 105, 59.878553196))[0])

    # Sketch24 → Cut-Extrude14 (cut)
    with BuildSketch(Plane.XY.offset(59.87855319631415)):
        with Locations((-2.9102395598225, 105.25)):
            Rectangle(SKETCH24_W, SKETCH24_H)
    extrude(amount=-CUT_EXTRUDE14_DEPTH, mode=Mode.SUBTRACT)


with BuildPart() as cut_extrude13_piece_2:
    # of the separate pieces the step leaves, piece 2, a body of its own (cut_extrude13_pieces)
    add(cut_extrude6_piece_1.part.solids().sort_by_distance((-78, 105.25, 159))[0])


solid = cut_extrude13_piece_2.part
